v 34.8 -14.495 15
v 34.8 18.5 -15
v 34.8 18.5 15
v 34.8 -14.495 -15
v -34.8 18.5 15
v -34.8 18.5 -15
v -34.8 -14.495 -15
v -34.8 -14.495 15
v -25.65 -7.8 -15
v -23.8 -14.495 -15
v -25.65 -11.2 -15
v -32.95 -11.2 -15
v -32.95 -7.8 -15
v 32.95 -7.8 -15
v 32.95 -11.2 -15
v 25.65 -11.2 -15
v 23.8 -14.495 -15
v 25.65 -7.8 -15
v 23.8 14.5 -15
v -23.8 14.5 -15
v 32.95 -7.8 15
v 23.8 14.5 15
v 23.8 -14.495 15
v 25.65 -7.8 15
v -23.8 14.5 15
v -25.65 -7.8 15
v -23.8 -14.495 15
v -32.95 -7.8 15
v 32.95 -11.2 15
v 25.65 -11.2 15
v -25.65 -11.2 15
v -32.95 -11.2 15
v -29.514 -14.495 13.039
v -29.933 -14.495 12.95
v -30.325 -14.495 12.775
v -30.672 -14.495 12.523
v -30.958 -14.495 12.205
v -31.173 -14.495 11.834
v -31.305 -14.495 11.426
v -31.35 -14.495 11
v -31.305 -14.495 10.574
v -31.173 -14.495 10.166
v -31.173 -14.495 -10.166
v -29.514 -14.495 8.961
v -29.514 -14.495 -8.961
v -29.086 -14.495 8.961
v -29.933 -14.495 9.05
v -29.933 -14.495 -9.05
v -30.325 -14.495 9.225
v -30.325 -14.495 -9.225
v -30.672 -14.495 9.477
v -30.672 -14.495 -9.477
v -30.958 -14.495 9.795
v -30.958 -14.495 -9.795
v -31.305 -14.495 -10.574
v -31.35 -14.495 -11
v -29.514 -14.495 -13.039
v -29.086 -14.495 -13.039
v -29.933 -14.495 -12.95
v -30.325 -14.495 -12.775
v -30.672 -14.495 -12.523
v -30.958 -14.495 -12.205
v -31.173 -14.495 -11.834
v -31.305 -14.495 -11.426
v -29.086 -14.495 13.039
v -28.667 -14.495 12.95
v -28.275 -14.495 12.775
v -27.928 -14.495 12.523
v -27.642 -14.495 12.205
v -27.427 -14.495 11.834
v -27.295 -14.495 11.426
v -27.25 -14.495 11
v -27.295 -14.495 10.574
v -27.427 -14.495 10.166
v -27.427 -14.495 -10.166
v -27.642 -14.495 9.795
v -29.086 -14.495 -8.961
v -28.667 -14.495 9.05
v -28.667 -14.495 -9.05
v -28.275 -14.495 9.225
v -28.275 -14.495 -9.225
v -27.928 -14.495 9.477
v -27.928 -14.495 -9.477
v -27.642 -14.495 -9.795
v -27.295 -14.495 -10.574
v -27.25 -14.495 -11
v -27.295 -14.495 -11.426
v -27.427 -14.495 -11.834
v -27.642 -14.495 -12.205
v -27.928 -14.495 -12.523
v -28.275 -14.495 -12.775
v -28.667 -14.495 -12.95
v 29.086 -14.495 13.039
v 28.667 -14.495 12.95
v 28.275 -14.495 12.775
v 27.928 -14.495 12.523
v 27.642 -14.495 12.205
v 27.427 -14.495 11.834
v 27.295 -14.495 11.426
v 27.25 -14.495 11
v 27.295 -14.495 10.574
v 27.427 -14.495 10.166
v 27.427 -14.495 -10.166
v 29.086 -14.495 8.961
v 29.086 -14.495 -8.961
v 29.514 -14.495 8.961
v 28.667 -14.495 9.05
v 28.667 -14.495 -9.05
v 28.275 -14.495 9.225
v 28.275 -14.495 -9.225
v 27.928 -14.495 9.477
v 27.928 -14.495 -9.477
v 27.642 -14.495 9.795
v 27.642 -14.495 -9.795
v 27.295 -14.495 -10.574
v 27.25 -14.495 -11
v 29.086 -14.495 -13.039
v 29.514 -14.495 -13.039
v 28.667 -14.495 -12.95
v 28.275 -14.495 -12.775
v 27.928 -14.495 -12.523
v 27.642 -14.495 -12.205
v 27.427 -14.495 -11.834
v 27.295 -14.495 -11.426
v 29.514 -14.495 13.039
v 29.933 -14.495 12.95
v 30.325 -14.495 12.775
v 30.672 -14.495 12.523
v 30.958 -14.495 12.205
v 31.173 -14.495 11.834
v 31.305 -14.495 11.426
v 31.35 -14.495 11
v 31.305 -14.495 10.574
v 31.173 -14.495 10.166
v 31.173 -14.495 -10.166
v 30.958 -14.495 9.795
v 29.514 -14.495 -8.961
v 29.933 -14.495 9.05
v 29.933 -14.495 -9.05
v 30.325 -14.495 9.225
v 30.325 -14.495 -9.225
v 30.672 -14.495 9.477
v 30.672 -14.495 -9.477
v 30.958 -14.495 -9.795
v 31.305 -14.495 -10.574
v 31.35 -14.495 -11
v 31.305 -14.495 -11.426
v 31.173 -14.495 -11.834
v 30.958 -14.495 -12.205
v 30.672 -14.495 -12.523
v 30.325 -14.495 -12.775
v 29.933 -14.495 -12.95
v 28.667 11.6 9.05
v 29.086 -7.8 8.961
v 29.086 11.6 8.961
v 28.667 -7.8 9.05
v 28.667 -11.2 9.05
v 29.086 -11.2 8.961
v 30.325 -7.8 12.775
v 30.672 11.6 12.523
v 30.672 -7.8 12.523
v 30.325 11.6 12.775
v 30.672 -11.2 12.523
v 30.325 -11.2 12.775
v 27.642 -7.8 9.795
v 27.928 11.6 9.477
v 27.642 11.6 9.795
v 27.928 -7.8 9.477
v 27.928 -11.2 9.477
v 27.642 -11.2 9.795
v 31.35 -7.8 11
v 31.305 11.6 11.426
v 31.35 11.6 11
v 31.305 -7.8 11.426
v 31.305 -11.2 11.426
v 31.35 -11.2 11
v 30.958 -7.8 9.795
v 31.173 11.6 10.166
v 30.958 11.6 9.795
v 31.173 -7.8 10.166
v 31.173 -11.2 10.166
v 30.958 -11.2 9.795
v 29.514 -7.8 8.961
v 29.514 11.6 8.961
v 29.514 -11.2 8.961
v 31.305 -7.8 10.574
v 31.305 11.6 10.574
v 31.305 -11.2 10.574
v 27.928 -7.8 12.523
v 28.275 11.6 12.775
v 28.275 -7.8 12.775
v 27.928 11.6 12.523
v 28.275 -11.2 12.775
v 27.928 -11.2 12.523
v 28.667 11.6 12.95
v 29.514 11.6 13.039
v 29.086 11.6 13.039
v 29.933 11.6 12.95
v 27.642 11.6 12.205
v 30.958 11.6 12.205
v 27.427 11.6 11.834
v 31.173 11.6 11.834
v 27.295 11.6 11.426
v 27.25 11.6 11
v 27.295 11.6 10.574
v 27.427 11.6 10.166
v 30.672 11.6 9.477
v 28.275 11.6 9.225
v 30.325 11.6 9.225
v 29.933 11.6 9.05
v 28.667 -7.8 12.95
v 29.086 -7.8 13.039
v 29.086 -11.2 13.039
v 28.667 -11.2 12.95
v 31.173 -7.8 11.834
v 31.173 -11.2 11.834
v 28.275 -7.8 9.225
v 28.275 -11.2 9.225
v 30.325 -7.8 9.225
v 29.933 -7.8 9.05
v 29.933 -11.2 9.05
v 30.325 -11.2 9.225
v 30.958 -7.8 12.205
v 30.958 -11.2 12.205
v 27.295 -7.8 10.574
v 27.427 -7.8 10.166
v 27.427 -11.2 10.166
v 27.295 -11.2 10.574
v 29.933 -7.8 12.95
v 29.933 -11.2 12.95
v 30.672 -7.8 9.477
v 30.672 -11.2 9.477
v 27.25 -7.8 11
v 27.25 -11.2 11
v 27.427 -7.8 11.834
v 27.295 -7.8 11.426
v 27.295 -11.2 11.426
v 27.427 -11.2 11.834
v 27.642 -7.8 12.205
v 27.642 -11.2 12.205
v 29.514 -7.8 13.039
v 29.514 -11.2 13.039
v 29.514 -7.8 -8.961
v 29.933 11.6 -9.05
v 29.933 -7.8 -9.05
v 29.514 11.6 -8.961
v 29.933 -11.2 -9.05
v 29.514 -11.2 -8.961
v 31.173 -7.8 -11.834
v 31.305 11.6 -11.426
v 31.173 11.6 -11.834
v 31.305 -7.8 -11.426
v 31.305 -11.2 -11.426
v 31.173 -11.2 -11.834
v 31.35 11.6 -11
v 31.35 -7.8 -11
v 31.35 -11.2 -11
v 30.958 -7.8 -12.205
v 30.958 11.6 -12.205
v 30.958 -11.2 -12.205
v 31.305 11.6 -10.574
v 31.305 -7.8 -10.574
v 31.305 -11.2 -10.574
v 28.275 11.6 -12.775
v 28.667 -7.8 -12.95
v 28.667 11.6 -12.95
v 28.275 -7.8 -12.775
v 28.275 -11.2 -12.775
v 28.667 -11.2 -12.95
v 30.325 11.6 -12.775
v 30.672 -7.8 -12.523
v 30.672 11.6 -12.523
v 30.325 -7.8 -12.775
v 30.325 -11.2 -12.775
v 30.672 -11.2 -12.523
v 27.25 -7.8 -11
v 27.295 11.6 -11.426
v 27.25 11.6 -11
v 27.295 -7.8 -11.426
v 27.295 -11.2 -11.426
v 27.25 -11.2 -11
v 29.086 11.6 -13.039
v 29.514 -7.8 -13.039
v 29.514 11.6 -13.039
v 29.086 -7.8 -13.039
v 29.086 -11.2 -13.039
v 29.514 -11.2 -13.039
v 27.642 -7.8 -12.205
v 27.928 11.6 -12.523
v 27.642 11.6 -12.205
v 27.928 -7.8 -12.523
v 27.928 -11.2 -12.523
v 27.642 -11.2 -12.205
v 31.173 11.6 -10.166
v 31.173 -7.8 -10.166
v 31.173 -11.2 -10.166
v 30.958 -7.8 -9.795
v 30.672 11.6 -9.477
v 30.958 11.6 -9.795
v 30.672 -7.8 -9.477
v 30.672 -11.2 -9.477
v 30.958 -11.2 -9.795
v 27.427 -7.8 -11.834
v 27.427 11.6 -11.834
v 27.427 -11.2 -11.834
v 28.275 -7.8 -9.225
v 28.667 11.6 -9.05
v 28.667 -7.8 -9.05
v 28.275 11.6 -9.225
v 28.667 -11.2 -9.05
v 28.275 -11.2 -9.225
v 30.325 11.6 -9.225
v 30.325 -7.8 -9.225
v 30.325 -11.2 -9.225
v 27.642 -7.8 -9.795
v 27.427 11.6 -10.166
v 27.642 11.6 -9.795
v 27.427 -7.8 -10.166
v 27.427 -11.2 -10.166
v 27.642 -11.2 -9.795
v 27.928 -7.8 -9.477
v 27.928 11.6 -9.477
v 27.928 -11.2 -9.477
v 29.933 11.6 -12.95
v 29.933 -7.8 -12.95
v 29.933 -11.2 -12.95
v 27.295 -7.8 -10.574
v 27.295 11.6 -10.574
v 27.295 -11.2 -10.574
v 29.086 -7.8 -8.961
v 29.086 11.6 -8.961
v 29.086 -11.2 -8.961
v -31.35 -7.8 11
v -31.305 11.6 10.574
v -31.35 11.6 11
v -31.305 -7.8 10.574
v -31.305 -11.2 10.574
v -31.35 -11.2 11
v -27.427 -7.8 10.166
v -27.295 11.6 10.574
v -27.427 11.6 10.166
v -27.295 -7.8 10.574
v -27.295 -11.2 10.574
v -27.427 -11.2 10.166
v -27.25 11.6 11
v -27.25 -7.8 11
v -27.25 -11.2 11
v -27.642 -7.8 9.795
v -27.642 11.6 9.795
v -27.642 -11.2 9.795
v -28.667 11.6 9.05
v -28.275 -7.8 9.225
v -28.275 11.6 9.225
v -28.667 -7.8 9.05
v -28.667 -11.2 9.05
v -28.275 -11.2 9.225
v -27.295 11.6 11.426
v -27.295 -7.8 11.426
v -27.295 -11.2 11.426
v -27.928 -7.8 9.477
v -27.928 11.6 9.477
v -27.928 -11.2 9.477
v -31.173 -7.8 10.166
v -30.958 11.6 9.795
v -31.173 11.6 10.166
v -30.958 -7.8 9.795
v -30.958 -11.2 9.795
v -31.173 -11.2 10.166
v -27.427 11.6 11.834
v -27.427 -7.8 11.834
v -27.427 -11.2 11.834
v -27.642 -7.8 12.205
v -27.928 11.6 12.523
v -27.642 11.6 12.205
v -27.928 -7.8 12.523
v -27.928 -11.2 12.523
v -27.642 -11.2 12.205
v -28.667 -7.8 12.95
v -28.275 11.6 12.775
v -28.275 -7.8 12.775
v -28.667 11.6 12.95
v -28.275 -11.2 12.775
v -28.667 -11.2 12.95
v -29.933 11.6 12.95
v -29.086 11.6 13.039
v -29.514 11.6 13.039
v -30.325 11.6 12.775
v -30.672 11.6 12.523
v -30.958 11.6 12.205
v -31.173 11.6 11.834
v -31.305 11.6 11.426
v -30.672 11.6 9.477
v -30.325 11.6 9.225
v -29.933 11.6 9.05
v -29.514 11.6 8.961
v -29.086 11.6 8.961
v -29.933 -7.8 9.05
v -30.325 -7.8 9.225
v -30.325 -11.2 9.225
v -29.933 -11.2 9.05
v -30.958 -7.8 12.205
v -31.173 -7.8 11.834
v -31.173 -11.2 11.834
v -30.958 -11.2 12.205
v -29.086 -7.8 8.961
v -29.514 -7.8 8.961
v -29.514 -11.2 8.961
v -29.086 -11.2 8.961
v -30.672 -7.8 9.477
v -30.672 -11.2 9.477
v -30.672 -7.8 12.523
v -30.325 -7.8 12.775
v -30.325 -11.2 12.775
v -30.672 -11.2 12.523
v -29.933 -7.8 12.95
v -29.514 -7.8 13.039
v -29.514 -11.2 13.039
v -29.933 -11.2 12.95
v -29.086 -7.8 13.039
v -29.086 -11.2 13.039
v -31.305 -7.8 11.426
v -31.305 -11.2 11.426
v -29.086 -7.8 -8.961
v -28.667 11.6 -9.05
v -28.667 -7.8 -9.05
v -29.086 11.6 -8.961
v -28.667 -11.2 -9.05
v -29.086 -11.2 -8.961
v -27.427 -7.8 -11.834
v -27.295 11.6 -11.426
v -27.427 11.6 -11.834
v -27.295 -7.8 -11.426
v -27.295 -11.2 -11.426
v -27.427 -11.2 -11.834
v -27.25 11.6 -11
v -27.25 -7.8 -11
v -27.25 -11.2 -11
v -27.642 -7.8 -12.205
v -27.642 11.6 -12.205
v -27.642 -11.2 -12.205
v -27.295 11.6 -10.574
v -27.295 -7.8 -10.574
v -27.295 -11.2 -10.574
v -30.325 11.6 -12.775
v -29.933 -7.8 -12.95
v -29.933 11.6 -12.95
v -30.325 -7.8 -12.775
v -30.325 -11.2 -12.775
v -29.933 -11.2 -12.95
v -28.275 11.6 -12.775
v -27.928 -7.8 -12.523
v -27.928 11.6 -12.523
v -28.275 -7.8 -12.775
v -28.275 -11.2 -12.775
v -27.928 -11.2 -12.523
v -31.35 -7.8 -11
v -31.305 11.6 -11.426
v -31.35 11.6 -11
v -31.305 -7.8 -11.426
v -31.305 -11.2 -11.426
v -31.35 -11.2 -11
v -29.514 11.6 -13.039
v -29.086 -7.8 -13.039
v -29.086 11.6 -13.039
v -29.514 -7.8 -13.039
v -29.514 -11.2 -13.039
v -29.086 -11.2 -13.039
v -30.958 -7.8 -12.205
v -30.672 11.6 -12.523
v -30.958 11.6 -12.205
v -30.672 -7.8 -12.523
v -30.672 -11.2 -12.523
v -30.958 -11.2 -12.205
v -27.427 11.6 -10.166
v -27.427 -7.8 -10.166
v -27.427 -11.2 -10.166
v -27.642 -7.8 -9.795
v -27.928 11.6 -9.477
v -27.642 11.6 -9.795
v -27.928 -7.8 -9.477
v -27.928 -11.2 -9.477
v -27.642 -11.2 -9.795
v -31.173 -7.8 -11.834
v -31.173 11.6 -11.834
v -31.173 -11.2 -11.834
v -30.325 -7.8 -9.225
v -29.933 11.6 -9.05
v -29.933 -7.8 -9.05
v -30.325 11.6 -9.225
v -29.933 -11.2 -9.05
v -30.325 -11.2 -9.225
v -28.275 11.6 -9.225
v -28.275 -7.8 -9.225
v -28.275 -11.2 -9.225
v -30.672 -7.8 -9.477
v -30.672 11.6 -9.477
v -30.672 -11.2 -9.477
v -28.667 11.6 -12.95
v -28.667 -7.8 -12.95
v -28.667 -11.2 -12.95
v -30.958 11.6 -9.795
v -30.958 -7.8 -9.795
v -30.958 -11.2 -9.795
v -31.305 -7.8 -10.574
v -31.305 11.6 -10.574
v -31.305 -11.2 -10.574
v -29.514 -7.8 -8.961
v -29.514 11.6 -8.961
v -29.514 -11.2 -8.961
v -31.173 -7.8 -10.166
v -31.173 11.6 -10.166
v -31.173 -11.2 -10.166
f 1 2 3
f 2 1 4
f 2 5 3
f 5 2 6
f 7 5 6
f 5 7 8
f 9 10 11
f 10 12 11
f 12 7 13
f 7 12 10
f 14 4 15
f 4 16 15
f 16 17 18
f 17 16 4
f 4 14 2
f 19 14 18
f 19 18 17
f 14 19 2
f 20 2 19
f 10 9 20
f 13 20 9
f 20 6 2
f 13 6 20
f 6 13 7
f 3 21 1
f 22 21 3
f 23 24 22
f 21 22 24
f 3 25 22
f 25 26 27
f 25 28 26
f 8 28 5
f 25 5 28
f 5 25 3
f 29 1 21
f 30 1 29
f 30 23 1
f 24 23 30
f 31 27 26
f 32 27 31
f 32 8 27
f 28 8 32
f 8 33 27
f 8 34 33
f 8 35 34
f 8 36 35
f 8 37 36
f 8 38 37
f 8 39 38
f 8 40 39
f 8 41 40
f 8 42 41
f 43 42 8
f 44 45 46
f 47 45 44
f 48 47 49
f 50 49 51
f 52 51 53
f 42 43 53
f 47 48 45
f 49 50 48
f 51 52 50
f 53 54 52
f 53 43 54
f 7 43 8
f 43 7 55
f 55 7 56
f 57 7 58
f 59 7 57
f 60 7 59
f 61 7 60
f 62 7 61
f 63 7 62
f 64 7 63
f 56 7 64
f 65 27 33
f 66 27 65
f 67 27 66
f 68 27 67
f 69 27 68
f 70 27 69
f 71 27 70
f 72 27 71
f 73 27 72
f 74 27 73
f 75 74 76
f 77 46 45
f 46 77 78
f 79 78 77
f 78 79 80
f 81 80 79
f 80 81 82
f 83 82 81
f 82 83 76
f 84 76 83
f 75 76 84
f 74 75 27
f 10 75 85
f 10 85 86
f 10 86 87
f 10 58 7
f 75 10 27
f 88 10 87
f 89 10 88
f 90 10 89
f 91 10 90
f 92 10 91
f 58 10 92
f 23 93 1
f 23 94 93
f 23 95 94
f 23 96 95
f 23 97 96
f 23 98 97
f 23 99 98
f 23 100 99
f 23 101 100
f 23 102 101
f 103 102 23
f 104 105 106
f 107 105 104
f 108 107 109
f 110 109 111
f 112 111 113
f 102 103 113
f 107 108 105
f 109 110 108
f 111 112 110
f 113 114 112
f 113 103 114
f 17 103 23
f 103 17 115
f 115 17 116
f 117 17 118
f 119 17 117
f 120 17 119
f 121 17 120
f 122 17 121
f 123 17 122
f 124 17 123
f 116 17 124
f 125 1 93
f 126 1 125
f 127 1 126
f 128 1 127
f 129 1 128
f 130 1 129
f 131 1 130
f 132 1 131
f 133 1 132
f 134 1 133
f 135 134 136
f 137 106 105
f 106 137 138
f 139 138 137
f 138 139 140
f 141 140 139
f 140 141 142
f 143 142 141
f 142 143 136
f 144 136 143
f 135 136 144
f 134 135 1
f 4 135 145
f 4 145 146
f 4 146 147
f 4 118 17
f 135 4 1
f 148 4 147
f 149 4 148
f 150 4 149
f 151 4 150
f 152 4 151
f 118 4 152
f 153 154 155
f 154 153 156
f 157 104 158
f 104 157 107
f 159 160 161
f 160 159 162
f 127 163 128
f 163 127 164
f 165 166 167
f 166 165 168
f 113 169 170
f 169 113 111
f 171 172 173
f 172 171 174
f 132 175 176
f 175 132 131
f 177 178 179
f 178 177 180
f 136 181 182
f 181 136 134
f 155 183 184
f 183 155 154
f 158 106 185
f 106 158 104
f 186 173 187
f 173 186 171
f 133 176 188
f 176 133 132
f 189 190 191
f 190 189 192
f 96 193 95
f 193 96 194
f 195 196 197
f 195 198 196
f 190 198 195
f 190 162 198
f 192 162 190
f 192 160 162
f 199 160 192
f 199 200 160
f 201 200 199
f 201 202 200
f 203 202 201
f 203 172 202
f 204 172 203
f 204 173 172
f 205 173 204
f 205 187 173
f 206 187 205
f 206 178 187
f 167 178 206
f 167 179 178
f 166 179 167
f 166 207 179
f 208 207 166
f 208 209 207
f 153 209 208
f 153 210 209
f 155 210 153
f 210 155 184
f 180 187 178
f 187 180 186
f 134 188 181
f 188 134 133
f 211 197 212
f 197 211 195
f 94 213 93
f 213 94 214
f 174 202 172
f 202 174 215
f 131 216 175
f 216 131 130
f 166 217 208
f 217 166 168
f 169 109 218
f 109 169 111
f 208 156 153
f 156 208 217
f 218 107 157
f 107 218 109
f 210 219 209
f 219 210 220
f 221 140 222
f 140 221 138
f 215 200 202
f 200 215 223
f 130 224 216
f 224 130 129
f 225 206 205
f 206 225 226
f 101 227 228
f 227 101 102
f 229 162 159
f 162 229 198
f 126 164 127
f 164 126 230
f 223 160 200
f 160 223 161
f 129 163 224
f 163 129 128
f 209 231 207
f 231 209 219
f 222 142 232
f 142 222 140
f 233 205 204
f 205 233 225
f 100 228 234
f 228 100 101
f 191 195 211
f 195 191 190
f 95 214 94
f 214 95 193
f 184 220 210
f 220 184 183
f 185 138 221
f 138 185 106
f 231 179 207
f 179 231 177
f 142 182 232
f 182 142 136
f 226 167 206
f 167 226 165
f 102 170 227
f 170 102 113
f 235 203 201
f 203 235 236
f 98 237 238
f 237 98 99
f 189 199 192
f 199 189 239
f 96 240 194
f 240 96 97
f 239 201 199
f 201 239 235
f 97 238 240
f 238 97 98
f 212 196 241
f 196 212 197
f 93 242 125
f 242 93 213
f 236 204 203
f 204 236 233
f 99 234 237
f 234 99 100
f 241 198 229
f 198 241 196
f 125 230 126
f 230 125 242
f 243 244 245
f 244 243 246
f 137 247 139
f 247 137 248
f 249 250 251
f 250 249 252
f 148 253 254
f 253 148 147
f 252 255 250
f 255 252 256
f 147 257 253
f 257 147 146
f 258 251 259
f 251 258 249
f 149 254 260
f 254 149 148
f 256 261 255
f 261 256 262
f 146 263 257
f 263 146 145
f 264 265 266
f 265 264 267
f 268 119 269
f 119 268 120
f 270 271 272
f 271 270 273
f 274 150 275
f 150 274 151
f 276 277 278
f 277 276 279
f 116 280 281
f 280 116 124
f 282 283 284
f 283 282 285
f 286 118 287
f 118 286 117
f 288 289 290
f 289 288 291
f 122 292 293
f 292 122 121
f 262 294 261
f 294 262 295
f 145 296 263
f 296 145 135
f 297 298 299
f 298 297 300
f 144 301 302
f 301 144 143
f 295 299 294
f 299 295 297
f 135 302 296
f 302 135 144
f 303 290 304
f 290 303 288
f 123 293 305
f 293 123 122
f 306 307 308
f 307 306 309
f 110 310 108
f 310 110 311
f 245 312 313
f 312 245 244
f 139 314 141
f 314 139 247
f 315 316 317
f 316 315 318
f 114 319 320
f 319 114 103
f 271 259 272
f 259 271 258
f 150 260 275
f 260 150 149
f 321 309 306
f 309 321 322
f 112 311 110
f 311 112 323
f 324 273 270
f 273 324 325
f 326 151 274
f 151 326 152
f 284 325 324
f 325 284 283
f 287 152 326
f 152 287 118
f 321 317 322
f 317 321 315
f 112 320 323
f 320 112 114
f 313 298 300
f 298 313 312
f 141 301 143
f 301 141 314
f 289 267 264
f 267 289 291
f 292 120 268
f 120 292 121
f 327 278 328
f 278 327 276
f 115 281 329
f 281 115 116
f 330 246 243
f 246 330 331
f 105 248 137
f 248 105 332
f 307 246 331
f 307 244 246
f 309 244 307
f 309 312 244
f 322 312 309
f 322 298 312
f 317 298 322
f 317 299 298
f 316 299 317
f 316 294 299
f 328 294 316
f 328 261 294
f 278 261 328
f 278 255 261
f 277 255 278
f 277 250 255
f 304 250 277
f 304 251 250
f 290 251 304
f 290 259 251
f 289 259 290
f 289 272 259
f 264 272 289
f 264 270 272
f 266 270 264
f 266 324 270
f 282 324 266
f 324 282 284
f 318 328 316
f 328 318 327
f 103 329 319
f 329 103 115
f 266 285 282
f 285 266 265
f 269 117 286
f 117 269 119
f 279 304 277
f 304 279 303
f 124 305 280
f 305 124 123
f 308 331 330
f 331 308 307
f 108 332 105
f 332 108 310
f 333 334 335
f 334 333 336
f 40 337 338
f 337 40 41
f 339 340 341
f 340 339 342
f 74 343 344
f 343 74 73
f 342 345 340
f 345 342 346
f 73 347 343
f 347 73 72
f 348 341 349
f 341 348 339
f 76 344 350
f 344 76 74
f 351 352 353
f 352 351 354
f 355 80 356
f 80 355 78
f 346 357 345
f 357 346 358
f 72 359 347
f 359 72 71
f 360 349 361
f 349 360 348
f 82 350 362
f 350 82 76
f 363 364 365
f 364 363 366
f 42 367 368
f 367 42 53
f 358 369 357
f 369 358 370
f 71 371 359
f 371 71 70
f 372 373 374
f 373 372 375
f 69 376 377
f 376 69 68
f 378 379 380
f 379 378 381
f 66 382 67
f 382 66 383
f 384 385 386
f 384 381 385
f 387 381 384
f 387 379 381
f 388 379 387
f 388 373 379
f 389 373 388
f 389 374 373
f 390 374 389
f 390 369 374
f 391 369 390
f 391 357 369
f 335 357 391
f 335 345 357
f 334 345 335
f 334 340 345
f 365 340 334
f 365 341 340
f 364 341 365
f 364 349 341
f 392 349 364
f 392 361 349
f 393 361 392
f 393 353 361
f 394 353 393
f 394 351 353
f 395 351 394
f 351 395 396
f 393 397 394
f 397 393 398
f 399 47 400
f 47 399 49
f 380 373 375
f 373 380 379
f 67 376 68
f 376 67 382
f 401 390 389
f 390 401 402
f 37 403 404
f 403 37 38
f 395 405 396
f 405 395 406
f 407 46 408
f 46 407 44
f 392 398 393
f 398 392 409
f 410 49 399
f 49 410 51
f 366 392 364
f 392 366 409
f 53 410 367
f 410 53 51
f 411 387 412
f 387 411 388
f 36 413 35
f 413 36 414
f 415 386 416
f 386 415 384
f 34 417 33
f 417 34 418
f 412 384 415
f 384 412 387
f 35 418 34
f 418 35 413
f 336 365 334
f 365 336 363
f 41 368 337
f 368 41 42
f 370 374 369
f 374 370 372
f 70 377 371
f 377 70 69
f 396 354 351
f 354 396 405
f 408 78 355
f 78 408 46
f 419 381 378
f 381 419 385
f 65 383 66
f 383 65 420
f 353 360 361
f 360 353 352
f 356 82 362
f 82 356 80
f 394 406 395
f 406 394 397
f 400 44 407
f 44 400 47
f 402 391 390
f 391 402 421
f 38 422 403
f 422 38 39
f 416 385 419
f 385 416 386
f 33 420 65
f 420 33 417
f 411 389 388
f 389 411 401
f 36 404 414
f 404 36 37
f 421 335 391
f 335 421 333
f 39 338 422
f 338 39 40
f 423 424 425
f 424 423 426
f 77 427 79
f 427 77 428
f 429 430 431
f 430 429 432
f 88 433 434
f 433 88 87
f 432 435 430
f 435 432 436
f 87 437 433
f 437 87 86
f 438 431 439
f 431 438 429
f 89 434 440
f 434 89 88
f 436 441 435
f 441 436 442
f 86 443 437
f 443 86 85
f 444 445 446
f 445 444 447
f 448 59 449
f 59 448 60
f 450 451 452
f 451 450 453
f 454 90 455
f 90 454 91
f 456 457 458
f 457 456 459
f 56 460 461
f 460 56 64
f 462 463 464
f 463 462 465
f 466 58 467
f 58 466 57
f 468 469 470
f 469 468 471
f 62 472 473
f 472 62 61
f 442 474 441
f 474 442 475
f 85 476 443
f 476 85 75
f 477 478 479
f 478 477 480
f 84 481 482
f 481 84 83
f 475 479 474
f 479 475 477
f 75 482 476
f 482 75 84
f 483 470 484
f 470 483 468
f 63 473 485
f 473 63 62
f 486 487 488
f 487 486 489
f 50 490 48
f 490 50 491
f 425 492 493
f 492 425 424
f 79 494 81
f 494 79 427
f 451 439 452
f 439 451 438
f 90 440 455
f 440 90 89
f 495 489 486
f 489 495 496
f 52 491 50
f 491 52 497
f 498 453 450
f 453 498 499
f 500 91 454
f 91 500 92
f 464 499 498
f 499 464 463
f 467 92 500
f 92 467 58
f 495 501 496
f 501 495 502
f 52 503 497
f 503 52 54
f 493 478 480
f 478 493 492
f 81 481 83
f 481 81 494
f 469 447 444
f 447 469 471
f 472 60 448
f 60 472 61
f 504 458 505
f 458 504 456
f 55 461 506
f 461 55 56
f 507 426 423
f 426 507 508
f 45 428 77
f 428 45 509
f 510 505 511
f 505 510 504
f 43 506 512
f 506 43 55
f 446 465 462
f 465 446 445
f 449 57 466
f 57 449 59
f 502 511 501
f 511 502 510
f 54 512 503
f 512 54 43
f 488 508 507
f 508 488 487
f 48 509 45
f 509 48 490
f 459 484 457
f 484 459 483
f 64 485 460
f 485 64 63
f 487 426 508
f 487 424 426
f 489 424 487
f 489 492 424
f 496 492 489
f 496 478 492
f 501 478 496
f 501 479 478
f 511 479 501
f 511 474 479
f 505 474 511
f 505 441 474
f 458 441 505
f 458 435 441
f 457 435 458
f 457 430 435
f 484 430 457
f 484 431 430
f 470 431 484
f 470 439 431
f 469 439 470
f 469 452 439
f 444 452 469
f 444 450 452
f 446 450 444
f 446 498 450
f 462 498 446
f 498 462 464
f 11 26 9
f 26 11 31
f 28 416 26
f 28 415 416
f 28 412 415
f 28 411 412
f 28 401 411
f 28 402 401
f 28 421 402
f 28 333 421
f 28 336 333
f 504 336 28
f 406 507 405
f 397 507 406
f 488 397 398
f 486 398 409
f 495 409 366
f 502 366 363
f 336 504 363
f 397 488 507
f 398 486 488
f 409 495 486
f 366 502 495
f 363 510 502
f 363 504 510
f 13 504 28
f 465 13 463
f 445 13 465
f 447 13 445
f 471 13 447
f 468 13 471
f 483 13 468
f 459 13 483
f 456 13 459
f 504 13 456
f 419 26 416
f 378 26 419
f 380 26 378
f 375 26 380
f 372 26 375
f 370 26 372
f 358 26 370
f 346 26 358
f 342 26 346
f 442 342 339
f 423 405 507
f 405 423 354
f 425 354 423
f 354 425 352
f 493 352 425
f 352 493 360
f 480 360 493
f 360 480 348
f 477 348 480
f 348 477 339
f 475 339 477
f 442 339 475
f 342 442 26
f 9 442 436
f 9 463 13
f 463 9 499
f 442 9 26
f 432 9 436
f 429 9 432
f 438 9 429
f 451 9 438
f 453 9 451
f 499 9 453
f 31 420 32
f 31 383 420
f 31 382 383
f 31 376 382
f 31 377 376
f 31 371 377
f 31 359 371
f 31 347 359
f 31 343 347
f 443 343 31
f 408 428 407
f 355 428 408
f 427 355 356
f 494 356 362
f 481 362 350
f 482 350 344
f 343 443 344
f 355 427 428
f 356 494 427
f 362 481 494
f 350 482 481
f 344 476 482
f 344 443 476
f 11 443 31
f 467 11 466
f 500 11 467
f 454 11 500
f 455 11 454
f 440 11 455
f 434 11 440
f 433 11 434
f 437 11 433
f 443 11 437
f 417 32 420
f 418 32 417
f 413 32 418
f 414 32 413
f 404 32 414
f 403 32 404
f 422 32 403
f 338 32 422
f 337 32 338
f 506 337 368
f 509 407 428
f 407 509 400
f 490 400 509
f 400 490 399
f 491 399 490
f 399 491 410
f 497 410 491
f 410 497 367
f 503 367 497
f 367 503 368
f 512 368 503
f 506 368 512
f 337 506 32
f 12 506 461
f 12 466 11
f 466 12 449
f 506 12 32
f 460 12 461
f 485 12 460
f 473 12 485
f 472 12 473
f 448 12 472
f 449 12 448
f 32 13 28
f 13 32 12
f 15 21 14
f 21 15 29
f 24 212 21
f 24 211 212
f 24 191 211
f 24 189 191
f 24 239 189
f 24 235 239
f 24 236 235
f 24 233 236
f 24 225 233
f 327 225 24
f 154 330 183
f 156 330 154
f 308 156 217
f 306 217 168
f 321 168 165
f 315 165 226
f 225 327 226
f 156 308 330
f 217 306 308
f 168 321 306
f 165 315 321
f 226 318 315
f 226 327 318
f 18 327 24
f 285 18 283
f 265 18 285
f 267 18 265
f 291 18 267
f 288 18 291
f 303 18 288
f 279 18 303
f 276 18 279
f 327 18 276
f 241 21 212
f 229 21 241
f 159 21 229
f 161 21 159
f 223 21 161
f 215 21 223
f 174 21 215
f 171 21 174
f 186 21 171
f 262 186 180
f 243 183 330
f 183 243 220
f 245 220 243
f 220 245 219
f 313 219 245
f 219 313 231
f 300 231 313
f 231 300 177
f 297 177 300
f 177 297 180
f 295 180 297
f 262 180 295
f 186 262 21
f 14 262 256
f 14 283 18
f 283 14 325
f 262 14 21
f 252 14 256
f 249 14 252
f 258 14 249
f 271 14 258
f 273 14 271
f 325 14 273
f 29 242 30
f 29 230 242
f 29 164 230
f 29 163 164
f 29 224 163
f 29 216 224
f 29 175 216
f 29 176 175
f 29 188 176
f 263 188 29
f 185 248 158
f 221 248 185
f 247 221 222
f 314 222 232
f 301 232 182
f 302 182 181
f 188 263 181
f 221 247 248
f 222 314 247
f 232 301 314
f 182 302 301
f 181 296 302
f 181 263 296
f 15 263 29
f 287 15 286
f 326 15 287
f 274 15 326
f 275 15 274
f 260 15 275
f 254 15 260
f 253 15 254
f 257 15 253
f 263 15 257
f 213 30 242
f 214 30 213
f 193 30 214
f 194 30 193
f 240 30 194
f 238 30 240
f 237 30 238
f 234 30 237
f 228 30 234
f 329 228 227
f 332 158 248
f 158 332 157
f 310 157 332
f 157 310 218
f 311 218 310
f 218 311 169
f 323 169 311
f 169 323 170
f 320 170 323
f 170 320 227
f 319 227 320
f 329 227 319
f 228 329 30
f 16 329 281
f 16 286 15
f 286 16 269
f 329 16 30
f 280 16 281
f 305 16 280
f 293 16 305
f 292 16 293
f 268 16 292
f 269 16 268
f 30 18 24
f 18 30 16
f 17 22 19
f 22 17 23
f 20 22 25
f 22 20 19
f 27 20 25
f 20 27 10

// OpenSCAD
width=47.6;
height=29;
nuthole=7.3;
nutheight=3.4;


module clamp() {
    difference() {
        cube([width+22, 30, height+8], center=true);
        // bottom
        translate([0, 0, -height])
            cube([2*width, 2*100, height+0.01], center=true);
        // holes
        $fn=30;
        translate([width/2+11/2, -11, -height])
            cylinder(1.4*height, d=4.1);
        translate([width/2+11/2, +11, -height])
            cylinder(1.4*height, d=4.1);
        translate([-width/2-11/2, -11, -height])
            cylinder(1.4*height, d=4.1);
        translate([-width/2-11/2, +11, -height])
            cylinder(1.4*height, d=4.1);
        // nut hole
        translate([-(width+11)/2, 0, -height/2+5])
            cube([nuthole, 60, nutheight], center=true);
        translate([+(width+11)/2, 0, -height/2+5])
            cube([nuthole, 60, nutheight], center=true);

        // power adapter
        cube([width, 50, height], center=true);
    }
}

rotate([-90,0,0])
    clamp();

/*
difference() {
    cylinder(4, d=10);
    translate([0,0,1.01])
        nuthole();
    translate([0,0,-.01])
        cylinder(5,d=4,$fn=50);
}
*/
